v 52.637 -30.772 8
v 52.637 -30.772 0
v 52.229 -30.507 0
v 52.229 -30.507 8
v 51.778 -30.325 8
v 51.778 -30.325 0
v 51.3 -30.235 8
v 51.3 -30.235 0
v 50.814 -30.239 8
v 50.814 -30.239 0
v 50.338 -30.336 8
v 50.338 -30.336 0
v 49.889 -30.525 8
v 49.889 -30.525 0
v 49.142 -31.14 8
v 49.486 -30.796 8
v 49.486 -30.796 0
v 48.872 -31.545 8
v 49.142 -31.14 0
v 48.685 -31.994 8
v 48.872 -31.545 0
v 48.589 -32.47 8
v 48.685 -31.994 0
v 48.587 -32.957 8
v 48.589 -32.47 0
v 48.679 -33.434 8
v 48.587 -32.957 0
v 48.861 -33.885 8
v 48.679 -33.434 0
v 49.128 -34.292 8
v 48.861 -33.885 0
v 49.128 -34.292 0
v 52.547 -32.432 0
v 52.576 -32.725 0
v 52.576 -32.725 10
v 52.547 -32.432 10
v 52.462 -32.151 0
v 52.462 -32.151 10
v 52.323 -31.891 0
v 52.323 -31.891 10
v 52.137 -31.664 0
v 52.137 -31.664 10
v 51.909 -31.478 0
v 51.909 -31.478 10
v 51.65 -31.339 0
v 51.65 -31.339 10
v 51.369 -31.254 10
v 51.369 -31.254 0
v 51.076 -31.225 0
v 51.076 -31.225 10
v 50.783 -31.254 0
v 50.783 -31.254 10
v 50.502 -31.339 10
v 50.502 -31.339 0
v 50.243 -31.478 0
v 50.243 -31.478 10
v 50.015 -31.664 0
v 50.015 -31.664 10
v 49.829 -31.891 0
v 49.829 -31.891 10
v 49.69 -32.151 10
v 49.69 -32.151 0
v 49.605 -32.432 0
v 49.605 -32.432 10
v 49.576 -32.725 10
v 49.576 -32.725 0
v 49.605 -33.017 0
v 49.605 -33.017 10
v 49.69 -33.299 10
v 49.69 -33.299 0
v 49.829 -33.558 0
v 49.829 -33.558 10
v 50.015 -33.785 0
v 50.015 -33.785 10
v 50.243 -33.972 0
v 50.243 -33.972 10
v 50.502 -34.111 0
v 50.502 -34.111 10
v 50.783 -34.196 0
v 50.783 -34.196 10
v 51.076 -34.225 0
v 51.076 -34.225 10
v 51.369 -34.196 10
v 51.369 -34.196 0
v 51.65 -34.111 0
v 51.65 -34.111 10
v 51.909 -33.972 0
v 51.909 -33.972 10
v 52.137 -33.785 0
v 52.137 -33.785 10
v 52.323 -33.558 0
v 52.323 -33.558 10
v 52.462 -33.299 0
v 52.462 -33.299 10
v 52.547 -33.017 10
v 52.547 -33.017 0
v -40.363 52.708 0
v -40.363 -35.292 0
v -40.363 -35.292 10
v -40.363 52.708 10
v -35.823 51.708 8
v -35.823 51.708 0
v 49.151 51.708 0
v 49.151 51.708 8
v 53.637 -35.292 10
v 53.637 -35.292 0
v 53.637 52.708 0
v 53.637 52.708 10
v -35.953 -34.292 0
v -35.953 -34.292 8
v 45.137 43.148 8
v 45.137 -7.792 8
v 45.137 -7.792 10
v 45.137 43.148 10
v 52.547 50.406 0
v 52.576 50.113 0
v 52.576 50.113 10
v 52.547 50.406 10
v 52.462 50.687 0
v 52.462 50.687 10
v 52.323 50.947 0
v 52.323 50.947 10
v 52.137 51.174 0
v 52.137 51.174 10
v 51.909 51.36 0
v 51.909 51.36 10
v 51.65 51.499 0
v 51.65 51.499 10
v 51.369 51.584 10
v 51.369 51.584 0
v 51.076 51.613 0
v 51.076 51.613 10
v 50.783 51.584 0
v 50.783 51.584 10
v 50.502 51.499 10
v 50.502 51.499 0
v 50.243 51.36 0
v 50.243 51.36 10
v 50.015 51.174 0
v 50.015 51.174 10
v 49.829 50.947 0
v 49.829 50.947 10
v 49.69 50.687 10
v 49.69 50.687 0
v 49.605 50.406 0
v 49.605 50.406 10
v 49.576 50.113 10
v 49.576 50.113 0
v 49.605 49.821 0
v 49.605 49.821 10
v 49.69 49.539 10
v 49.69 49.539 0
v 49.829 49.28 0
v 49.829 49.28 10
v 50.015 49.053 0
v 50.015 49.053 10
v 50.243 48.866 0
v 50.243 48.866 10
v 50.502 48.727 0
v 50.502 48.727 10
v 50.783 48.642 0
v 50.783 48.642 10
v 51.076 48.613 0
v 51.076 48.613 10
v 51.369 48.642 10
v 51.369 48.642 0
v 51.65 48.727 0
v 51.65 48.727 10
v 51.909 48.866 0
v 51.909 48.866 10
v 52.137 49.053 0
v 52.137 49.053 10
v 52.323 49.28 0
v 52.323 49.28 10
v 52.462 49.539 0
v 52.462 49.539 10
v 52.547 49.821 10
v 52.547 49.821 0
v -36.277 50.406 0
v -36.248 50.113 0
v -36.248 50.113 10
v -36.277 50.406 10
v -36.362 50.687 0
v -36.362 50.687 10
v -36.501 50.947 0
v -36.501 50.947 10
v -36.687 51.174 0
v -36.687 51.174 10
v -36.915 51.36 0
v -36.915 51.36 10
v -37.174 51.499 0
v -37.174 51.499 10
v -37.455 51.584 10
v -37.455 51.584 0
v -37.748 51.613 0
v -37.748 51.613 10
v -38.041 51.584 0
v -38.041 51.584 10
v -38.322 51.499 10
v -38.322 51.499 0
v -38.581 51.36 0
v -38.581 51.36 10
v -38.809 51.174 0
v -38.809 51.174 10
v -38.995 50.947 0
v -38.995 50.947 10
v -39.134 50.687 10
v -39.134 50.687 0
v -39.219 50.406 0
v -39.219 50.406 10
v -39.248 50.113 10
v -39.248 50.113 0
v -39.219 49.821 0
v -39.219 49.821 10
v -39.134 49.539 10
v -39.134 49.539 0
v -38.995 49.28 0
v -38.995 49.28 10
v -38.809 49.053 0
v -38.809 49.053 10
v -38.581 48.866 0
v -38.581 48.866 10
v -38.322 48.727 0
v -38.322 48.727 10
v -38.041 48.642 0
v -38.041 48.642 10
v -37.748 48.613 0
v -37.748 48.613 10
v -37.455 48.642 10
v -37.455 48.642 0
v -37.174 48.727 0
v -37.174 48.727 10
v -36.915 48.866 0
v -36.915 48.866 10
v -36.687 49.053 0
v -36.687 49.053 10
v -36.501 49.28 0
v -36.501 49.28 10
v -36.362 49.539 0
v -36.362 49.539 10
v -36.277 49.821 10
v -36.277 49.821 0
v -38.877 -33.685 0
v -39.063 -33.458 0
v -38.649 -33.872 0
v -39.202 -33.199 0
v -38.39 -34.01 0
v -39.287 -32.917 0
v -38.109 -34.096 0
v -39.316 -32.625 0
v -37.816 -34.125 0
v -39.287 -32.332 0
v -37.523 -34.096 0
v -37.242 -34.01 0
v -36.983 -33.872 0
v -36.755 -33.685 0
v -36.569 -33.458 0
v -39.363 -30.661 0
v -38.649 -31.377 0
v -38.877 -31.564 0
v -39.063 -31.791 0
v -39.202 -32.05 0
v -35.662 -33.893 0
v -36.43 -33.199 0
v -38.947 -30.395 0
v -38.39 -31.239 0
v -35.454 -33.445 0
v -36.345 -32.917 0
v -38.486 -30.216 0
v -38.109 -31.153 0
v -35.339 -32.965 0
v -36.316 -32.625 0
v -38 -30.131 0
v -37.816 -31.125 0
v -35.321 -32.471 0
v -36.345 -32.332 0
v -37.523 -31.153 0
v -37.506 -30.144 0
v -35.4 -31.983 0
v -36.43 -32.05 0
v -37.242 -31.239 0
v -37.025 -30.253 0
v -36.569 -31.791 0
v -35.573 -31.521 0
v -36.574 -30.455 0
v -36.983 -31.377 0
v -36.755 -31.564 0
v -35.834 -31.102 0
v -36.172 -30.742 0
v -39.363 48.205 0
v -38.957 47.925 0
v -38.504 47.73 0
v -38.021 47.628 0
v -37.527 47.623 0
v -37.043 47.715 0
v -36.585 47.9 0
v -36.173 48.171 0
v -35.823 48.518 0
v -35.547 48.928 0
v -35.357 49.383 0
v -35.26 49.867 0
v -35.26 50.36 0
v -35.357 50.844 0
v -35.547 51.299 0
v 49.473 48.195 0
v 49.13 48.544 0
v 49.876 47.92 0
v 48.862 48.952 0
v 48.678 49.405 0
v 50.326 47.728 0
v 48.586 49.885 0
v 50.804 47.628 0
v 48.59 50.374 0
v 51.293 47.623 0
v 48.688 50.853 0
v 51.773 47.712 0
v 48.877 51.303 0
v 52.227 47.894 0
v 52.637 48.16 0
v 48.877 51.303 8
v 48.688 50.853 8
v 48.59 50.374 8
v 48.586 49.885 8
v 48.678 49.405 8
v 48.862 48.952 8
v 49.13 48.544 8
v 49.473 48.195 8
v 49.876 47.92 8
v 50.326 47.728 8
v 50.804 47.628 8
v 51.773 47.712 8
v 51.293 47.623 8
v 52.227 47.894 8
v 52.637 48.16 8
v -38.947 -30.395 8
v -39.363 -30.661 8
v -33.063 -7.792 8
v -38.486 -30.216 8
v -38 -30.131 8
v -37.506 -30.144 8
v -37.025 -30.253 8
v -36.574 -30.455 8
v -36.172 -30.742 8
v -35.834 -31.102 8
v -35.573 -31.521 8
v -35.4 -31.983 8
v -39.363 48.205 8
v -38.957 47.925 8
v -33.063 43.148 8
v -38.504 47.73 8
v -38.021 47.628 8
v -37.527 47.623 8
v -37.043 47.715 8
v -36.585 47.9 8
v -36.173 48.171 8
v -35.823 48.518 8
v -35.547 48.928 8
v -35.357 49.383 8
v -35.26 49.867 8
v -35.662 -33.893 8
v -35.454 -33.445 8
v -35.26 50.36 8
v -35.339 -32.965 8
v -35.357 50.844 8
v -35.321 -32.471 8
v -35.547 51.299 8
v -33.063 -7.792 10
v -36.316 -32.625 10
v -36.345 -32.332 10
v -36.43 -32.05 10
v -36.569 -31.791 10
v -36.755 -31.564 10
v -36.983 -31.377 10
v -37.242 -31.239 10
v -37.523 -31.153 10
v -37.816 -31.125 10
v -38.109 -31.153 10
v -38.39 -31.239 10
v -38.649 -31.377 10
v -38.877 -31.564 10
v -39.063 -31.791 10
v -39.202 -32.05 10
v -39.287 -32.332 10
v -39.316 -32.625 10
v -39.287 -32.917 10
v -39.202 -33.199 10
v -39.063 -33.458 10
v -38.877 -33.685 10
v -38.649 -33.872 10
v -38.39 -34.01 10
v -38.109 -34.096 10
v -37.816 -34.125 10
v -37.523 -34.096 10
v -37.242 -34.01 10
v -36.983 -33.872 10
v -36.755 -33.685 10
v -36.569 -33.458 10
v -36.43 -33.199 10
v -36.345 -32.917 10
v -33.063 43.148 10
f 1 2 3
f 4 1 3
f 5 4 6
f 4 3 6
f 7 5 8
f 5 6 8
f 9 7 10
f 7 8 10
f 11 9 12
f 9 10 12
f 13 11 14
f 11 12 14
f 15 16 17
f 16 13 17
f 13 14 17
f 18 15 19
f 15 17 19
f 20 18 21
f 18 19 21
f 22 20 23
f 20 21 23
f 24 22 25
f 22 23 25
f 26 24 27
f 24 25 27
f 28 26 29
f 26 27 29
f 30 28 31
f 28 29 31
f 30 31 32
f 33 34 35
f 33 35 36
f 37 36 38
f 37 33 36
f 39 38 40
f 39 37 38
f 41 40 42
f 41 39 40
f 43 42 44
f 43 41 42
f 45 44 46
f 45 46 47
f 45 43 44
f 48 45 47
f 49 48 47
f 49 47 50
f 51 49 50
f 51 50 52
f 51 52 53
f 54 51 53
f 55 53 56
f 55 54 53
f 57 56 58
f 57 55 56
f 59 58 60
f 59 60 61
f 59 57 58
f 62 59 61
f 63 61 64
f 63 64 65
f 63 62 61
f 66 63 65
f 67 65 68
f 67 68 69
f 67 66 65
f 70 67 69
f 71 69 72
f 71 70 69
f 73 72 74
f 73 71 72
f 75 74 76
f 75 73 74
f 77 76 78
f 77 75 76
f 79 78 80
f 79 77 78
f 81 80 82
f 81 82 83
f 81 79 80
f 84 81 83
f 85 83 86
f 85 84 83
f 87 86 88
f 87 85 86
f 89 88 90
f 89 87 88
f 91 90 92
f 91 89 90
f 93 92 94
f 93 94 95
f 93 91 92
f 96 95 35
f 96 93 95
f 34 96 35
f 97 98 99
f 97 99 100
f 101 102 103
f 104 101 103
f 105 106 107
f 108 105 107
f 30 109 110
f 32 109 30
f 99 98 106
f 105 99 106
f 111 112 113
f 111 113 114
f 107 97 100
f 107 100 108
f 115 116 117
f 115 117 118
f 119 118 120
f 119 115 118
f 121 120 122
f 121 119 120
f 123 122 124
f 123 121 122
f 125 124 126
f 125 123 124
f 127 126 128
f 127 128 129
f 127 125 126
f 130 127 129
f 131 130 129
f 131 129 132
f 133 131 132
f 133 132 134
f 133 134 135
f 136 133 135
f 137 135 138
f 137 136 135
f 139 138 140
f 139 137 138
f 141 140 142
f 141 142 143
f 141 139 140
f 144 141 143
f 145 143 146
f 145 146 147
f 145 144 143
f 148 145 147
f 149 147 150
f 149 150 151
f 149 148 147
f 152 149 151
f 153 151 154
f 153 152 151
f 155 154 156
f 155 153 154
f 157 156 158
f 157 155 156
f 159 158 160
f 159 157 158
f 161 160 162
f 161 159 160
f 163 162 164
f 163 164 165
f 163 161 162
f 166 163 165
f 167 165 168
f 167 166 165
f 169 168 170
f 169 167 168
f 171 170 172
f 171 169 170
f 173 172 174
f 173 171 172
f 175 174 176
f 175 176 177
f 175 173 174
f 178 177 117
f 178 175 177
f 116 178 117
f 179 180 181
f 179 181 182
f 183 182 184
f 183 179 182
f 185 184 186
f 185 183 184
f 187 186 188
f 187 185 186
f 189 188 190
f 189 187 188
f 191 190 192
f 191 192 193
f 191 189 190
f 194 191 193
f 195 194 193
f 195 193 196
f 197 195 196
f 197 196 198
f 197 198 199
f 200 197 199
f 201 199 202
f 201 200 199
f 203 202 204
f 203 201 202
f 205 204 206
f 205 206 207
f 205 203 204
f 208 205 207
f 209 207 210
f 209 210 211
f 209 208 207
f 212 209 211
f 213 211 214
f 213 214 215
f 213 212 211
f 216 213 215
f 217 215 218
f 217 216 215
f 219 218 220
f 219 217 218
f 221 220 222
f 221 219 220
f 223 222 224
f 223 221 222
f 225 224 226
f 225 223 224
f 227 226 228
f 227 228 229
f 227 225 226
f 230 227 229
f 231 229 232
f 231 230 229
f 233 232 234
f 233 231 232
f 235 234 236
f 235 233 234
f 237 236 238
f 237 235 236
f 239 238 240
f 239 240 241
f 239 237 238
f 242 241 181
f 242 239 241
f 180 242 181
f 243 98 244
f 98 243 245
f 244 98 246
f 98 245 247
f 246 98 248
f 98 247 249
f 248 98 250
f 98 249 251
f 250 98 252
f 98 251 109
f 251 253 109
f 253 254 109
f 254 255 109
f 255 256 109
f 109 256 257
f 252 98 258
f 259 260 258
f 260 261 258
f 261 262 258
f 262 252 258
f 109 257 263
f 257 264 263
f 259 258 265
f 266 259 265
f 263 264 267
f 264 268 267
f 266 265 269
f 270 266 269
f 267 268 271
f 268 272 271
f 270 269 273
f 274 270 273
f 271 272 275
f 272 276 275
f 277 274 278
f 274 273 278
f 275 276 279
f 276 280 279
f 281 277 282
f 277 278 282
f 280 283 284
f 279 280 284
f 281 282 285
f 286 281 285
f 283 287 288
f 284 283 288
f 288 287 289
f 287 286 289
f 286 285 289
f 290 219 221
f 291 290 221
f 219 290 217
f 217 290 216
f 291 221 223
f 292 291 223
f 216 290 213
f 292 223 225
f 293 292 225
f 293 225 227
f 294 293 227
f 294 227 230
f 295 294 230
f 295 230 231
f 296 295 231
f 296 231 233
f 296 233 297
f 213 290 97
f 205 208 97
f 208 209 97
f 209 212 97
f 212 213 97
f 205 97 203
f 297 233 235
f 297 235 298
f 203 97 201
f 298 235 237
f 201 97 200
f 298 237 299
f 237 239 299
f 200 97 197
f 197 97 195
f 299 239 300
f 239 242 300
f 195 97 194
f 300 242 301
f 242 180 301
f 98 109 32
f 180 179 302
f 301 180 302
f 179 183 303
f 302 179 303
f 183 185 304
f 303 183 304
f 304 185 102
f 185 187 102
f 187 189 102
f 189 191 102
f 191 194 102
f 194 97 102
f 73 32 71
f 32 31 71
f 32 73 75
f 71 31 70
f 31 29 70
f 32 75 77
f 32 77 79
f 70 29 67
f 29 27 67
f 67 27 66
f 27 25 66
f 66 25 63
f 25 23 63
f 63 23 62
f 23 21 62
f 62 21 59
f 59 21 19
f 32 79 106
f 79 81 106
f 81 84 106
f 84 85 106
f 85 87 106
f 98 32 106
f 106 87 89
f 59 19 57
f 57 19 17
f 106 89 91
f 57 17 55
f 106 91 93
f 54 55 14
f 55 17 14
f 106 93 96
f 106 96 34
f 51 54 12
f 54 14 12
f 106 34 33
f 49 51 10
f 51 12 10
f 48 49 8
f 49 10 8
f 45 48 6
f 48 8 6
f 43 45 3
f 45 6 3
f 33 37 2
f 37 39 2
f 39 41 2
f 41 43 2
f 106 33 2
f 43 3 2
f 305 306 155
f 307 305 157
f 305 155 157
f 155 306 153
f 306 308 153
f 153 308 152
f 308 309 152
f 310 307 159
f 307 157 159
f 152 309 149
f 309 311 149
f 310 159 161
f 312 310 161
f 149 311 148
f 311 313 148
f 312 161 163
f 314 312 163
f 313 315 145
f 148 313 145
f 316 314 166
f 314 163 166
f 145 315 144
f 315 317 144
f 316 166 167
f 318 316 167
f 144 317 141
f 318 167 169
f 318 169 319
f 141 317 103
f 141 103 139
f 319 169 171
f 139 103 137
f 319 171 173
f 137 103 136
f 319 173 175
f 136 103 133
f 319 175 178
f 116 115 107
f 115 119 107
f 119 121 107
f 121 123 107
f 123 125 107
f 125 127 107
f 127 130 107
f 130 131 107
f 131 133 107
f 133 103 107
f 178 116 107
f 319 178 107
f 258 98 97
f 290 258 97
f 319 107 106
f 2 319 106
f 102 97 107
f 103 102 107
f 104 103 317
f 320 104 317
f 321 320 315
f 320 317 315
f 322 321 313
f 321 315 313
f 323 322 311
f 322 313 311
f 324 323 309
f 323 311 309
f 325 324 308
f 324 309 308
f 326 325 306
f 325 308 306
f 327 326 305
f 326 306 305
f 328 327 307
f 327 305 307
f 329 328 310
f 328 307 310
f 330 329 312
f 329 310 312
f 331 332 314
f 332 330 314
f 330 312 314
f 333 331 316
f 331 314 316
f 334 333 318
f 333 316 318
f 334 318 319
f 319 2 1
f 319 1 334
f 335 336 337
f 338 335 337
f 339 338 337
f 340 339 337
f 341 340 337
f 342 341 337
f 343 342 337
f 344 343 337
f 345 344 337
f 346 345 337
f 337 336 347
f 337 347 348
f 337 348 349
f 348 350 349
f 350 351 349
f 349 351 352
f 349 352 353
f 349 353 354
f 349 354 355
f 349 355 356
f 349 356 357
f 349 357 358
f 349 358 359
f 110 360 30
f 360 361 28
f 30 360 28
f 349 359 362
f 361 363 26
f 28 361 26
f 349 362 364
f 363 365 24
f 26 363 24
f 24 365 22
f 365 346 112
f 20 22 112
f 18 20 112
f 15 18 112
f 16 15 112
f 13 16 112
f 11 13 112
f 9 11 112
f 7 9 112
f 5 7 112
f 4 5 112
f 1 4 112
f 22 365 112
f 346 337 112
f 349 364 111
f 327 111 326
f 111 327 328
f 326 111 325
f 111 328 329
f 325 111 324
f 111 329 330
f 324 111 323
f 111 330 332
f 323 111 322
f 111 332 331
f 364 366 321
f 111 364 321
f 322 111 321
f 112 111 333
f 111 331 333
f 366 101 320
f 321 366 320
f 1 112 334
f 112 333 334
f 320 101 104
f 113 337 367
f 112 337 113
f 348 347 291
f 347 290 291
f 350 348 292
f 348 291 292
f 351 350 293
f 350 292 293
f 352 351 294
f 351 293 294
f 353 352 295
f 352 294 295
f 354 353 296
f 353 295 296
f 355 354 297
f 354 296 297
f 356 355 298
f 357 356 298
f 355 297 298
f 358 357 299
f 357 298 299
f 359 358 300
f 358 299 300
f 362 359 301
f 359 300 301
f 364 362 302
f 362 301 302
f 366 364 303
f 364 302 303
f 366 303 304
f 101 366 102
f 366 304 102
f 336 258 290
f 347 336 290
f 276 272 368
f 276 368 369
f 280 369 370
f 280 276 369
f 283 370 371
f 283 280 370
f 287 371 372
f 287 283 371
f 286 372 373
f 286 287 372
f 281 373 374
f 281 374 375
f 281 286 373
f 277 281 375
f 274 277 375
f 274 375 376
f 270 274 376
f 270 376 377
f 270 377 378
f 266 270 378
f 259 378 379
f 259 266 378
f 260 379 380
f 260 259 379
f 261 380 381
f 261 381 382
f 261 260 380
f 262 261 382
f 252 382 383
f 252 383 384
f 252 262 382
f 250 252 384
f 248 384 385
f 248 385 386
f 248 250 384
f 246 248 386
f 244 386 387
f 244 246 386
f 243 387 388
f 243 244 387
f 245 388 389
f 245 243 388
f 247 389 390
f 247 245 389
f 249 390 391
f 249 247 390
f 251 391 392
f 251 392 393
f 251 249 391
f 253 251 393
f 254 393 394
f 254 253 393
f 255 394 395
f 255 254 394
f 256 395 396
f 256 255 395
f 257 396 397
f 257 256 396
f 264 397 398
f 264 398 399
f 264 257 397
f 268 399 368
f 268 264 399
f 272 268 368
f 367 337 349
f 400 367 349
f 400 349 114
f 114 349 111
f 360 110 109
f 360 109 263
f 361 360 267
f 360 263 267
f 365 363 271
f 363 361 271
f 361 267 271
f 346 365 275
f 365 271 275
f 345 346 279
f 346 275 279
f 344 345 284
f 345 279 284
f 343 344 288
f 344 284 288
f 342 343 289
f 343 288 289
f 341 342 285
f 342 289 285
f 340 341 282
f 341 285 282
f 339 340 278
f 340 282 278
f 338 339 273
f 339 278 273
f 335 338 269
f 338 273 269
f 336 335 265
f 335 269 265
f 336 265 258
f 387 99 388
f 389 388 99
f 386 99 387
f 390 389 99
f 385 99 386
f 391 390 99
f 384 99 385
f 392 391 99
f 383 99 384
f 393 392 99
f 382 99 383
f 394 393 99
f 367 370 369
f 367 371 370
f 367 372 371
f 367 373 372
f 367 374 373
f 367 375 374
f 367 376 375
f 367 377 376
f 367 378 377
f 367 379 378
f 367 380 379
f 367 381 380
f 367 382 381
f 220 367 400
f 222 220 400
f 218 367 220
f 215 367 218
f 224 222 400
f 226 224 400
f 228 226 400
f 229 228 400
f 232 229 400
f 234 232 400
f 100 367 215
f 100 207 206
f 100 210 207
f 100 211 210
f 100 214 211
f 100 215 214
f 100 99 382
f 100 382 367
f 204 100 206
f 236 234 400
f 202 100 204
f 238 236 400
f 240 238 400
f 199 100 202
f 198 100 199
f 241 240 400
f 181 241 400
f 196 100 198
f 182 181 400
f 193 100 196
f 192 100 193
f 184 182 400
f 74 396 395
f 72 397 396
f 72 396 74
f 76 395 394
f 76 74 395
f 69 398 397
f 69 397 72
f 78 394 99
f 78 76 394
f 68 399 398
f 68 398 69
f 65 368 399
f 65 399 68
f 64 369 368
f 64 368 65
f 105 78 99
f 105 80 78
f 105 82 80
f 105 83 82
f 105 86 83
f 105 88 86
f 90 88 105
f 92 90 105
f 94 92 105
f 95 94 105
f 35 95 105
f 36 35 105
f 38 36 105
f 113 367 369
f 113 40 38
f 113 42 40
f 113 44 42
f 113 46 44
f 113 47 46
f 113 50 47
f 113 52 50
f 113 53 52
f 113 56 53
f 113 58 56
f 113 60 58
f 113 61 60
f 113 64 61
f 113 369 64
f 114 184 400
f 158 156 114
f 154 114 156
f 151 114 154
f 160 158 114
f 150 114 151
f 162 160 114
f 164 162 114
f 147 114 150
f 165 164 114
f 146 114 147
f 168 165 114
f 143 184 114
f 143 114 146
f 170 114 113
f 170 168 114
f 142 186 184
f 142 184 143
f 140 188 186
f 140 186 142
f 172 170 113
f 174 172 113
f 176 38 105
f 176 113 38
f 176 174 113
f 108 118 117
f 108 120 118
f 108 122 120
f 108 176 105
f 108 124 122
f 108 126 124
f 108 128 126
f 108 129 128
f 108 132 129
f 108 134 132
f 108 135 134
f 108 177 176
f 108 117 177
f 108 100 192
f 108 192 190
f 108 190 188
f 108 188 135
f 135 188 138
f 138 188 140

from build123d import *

# Parameters (mm, degrees)
F0_W     = 94
F0_H     = 88
F0_R     = 2.5
F1_DEPTH = 10
F2_W     = 92
F2_H     = 86
F3_DEPTH = 8
F4_W     = 78.2
F4_H     = 50.94
F5_DEPTH = 25
F0_R_2   = 1.5
F6_DEPTH = 10


with BuildPart() as f1:
    # F0 (on Top) → F1 (new body)
    with BuildSketch(Plane.XY):
        with Locations((6.636954, 8.70822)):
            Rectangle(F0_W, F0_H)
        with Locations((-37.816051, -32.62452)):
            Circle(F0_R, mode=Mode.SUBTRACT)
        with Locations((51.075991, -32.724809)):
            Circle(F0_R, mode=Mode.SUBTRACT)
        with Locations((-37.748028, 50.113171)):
            Circle(F0_R, mode=Mode.SUBTRACT)
        with Locations((51.075991, 50.113171)):
            Circle(F0_R, mode=Mode.SUBTRACT)
    extrude(amount=F1_DEPTH)

    # F2 (on Top) → F3 (cut)
    with BuildSketch(Plane.XY):
        with Locations((6.636954, 8.70822)):
            Rectangle(F2_W, F2_H)
    extrude(amount=F3_DEPTH, mode=Mode.SUBTRACT)

    # F4 (on Top) → F5 (cut)
    with BuildSketch(Plane.XY):
        with Locations((6.036954, 17.67822)):
            Rectangle(F4_W, F4_H)
    extrude(amount=F5_DEPTH, mode=Mode.SUBTRACT)

    # F0 (on Top) → F6 (join)
    with BuildSketch(Plane.XY):
        with Locations((-37.816051, -32.62452)):
            Circle(F0_R)
        with Locations((-37.816051, -32.62452)):
            Circle(F0_R_2, mode=Mode.SUBTRACT)
        with Locations((-37.748028, 50.113171)):
            Circle(F0_R)
        with Locations((-37.748028, 50.113171)):
            Circle(F0_R_2, mode=Mode.SUBTRACT)
        with Locations((51.075991, 50.113171)):
            Circle(F0_R)
        with Locations((51.075991, 50.113171)):
            Circle(F0_R_2, mode=Mode.SUBTRACT)
        with Locations((51.075991, -32.724809)):
            Circle(F0_R)
        with Locations((51.075991, -32.724809)):
            Circle(F0_R_2, mode=Mode.SUBTRACT)
    extrude(amount=F6_DEPTH)


solid = f1.part
